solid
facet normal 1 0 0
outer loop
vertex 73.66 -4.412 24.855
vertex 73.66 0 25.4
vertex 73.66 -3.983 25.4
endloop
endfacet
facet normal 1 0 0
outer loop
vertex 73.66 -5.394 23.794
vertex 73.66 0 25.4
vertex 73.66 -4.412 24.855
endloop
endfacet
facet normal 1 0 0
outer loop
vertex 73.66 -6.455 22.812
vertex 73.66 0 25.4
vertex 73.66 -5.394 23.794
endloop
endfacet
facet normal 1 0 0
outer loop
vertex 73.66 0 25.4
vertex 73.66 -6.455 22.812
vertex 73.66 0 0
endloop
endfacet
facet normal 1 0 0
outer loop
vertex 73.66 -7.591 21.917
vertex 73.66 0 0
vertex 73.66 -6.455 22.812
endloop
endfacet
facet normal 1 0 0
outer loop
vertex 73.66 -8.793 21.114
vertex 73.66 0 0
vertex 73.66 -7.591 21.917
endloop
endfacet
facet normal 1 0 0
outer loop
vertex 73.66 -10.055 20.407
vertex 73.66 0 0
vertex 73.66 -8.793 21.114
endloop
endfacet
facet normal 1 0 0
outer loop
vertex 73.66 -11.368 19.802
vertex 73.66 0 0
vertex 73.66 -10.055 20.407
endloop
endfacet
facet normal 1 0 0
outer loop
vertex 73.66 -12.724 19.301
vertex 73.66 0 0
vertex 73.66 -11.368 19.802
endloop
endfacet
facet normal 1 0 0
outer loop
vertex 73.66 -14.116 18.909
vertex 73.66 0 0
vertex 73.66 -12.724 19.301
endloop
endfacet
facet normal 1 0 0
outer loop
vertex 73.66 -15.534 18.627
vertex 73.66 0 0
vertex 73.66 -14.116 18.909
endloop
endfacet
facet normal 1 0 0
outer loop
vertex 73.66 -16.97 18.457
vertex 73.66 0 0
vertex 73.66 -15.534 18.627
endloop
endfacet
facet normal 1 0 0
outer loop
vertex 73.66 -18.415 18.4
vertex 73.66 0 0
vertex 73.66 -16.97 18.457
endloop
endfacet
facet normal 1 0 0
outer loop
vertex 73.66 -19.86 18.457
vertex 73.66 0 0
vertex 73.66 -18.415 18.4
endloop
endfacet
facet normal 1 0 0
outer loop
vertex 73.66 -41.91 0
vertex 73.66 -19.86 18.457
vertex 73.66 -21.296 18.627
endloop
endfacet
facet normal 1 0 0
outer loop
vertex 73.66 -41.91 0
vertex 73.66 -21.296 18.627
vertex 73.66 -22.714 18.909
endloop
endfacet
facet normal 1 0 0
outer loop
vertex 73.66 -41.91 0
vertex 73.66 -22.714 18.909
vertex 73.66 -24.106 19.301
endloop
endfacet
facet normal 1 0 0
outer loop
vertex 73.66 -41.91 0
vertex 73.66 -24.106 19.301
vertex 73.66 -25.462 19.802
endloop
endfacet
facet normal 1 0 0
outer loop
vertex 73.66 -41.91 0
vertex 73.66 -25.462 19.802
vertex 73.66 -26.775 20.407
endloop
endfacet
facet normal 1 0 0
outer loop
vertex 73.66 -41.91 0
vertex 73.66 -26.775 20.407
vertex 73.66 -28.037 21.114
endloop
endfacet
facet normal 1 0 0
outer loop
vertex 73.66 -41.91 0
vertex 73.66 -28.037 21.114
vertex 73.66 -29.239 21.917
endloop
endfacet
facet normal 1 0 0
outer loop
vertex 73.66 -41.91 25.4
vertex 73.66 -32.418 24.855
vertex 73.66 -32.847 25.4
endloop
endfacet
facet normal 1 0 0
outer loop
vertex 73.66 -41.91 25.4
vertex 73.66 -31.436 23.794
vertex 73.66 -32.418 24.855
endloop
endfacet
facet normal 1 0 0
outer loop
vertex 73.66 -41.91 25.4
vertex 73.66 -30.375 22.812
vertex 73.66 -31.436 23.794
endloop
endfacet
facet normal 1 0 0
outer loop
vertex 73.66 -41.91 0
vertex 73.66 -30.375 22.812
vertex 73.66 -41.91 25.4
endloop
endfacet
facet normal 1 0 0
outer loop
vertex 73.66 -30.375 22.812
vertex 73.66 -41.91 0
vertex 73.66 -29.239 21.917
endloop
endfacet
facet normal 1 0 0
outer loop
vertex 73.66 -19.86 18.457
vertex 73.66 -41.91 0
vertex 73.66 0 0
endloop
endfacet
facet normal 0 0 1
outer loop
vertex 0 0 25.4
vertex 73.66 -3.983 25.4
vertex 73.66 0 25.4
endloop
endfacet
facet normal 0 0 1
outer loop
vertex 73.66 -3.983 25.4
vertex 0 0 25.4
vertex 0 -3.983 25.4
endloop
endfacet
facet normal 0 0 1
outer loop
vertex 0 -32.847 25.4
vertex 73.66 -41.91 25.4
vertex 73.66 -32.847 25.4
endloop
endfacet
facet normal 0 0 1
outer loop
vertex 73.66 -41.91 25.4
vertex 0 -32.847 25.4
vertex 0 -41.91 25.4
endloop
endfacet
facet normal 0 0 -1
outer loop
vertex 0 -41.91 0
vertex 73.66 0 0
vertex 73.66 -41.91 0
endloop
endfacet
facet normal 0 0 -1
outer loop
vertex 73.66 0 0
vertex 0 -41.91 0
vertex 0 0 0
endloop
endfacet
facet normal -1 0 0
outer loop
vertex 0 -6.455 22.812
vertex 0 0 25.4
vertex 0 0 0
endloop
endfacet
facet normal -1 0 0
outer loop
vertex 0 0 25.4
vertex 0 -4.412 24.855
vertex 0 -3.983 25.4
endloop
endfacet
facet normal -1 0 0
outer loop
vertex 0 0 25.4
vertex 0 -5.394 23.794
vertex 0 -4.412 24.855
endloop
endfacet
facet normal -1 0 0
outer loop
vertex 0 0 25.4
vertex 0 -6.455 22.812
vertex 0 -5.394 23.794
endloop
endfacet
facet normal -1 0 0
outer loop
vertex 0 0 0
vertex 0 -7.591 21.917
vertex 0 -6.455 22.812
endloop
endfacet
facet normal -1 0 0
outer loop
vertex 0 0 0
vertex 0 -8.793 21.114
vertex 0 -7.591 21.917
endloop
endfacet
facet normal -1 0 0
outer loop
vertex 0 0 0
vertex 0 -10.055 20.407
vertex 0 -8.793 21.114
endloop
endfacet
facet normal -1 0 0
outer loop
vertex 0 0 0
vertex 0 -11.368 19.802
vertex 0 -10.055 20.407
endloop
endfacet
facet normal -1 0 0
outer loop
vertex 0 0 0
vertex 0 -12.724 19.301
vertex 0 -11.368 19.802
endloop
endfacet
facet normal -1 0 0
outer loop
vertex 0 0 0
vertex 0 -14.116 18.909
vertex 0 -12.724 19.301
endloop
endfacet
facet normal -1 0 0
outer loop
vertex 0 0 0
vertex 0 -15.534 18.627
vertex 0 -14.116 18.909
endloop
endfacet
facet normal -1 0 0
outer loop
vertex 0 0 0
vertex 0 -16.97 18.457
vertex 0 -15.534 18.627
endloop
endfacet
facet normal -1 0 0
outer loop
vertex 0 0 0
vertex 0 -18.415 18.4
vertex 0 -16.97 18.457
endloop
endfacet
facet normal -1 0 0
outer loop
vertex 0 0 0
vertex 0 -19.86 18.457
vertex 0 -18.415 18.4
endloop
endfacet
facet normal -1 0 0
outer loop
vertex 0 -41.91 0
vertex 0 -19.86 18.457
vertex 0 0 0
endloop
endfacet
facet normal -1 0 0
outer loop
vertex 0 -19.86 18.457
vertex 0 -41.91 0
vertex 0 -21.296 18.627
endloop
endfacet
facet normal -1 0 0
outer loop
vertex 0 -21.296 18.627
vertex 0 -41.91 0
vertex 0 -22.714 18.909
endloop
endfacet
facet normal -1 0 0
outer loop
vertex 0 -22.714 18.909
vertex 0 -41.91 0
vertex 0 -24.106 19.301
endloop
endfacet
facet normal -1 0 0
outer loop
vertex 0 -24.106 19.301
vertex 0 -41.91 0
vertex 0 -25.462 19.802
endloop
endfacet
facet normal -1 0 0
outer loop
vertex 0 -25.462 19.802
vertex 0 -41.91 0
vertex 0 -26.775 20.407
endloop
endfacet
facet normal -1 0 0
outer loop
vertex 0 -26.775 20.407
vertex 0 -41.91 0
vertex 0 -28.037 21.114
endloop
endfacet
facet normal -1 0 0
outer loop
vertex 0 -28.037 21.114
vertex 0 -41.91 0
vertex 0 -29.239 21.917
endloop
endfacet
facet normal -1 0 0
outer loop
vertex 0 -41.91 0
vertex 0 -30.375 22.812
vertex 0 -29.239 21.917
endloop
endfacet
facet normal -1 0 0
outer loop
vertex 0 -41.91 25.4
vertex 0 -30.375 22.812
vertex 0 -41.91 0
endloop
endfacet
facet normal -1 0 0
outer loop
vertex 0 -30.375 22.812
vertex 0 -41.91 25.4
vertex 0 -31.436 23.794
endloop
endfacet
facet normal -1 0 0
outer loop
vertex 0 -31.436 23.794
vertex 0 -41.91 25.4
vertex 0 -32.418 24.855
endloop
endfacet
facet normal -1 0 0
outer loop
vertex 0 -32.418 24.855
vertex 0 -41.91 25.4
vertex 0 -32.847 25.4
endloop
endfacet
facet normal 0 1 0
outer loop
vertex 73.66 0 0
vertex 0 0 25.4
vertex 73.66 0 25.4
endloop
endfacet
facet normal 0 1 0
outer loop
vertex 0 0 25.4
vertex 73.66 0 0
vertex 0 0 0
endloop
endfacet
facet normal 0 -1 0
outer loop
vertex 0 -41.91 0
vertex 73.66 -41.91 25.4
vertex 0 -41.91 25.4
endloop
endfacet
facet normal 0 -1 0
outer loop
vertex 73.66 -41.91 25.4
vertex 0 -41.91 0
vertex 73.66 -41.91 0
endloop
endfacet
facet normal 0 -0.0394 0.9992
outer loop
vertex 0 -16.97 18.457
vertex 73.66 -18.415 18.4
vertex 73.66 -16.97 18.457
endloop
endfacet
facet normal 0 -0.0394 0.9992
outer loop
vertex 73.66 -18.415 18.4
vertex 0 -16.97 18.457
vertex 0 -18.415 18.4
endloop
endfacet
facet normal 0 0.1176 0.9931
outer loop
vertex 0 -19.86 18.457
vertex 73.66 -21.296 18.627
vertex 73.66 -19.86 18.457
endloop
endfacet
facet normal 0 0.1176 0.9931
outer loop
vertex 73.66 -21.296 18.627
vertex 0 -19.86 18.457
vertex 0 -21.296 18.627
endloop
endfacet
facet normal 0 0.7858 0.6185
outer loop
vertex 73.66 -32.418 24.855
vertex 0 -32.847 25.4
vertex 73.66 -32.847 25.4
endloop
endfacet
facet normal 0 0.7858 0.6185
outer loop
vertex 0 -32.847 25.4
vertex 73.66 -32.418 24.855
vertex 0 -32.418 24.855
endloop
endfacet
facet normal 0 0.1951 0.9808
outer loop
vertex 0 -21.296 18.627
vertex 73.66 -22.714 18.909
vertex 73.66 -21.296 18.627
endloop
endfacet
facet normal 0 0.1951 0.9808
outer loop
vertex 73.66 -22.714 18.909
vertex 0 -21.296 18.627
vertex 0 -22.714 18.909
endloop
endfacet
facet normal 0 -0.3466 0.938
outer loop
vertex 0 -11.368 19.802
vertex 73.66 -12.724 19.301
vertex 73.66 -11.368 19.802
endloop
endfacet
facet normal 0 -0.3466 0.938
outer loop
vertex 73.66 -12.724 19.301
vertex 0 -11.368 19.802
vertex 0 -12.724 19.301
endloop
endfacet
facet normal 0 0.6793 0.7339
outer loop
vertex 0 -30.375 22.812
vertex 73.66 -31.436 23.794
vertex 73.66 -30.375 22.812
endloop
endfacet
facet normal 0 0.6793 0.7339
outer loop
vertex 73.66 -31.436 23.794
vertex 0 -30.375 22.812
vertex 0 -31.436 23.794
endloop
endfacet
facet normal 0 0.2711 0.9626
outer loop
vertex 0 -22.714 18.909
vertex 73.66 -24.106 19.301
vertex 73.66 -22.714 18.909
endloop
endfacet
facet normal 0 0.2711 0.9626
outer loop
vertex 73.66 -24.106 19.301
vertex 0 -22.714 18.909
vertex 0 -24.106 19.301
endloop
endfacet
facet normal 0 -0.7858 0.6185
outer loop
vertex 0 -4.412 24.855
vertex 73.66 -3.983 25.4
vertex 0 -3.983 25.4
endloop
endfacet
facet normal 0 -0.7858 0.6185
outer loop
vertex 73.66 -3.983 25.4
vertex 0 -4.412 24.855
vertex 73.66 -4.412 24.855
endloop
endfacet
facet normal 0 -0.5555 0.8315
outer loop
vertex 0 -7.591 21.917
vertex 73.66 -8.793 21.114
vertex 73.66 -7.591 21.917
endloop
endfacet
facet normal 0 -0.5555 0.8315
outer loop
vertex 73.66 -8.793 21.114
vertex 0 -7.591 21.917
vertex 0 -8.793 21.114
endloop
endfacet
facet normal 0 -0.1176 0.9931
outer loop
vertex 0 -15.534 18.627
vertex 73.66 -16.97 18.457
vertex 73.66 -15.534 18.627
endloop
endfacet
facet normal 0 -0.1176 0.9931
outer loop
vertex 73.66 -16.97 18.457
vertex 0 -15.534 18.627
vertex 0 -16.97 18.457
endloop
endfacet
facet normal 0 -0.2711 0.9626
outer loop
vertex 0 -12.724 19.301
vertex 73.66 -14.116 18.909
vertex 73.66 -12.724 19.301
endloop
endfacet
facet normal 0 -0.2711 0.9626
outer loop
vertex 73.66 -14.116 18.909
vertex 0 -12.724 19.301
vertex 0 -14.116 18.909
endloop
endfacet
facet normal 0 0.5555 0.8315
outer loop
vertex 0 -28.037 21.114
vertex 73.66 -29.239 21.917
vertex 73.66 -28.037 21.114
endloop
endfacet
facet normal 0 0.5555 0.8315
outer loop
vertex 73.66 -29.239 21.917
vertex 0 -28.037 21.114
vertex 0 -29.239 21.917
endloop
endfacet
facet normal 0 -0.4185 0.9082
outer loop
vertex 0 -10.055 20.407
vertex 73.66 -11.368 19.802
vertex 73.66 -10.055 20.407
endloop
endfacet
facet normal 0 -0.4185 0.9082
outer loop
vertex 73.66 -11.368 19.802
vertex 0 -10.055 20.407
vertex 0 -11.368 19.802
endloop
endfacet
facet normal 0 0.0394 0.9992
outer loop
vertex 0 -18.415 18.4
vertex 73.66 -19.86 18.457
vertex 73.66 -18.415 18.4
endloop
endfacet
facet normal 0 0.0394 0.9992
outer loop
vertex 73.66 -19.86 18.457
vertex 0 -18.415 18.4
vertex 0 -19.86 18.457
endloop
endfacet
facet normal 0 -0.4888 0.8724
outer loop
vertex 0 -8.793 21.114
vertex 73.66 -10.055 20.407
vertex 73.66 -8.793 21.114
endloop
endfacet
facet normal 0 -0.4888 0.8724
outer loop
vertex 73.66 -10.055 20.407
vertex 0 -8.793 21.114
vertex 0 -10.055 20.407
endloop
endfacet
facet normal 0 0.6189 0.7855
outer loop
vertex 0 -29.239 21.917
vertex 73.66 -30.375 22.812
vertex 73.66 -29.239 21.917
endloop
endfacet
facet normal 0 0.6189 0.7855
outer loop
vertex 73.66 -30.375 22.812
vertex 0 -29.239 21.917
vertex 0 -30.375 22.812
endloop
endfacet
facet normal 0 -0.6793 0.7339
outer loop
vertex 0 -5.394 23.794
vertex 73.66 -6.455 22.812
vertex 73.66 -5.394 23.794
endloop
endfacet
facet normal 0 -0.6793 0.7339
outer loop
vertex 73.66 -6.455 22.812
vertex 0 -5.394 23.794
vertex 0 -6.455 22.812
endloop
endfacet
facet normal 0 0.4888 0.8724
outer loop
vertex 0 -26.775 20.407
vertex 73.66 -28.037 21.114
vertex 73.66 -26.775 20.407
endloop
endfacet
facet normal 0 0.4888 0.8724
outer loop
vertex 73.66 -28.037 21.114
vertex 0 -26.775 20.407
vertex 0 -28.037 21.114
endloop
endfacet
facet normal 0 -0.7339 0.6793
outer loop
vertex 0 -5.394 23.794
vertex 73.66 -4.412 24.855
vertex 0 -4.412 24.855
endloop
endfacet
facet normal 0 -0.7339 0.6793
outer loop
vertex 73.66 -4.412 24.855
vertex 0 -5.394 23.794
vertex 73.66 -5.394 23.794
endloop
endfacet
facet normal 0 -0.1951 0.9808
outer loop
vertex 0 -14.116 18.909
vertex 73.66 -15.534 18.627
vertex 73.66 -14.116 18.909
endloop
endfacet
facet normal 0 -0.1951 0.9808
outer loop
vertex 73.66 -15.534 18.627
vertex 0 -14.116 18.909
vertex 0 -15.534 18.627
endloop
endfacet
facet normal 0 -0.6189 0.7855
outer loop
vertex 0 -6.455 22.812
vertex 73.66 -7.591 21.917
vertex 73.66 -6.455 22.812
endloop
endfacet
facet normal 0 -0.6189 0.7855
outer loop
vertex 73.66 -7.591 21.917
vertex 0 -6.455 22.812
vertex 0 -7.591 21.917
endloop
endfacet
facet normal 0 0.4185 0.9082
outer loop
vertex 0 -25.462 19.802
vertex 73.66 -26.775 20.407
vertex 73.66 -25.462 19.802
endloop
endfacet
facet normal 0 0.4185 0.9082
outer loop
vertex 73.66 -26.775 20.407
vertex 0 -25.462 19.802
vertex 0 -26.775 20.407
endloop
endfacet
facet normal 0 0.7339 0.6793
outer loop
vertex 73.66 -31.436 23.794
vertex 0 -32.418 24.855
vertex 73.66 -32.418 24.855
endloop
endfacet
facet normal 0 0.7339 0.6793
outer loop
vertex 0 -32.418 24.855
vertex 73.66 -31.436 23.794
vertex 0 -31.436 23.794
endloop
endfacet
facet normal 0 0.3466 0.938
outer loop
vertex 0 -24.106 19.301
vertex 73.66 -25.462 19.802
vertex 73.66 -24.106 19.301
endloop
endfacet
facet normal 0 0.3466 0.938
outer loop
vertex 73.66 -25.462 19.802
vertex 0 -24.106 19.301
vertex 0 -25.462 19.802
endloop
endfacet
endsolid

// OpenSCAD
ITOMM = 25.4;

D = 1.45 * ITOMM;
Y0 = 1.45 * ITOMM;
Y1 = 0.20 * ITOMM;
Y = Y0 + Y1;
X = 2.9 * ITOMM;
X1 = 1.1 * ITOMM;
X0 = (X - X1) / 2;
Z = 1.0 * ITOMM;

$fn = 80;

difference() {
    translate([0, -Y, 0]) cube(size=[X, Y, Z]);
    translate([-1, -Y0/2, Z + D/2 - 7.0]) rotate([0, 90, 0]) cylinder(h=100, d=D);
}
